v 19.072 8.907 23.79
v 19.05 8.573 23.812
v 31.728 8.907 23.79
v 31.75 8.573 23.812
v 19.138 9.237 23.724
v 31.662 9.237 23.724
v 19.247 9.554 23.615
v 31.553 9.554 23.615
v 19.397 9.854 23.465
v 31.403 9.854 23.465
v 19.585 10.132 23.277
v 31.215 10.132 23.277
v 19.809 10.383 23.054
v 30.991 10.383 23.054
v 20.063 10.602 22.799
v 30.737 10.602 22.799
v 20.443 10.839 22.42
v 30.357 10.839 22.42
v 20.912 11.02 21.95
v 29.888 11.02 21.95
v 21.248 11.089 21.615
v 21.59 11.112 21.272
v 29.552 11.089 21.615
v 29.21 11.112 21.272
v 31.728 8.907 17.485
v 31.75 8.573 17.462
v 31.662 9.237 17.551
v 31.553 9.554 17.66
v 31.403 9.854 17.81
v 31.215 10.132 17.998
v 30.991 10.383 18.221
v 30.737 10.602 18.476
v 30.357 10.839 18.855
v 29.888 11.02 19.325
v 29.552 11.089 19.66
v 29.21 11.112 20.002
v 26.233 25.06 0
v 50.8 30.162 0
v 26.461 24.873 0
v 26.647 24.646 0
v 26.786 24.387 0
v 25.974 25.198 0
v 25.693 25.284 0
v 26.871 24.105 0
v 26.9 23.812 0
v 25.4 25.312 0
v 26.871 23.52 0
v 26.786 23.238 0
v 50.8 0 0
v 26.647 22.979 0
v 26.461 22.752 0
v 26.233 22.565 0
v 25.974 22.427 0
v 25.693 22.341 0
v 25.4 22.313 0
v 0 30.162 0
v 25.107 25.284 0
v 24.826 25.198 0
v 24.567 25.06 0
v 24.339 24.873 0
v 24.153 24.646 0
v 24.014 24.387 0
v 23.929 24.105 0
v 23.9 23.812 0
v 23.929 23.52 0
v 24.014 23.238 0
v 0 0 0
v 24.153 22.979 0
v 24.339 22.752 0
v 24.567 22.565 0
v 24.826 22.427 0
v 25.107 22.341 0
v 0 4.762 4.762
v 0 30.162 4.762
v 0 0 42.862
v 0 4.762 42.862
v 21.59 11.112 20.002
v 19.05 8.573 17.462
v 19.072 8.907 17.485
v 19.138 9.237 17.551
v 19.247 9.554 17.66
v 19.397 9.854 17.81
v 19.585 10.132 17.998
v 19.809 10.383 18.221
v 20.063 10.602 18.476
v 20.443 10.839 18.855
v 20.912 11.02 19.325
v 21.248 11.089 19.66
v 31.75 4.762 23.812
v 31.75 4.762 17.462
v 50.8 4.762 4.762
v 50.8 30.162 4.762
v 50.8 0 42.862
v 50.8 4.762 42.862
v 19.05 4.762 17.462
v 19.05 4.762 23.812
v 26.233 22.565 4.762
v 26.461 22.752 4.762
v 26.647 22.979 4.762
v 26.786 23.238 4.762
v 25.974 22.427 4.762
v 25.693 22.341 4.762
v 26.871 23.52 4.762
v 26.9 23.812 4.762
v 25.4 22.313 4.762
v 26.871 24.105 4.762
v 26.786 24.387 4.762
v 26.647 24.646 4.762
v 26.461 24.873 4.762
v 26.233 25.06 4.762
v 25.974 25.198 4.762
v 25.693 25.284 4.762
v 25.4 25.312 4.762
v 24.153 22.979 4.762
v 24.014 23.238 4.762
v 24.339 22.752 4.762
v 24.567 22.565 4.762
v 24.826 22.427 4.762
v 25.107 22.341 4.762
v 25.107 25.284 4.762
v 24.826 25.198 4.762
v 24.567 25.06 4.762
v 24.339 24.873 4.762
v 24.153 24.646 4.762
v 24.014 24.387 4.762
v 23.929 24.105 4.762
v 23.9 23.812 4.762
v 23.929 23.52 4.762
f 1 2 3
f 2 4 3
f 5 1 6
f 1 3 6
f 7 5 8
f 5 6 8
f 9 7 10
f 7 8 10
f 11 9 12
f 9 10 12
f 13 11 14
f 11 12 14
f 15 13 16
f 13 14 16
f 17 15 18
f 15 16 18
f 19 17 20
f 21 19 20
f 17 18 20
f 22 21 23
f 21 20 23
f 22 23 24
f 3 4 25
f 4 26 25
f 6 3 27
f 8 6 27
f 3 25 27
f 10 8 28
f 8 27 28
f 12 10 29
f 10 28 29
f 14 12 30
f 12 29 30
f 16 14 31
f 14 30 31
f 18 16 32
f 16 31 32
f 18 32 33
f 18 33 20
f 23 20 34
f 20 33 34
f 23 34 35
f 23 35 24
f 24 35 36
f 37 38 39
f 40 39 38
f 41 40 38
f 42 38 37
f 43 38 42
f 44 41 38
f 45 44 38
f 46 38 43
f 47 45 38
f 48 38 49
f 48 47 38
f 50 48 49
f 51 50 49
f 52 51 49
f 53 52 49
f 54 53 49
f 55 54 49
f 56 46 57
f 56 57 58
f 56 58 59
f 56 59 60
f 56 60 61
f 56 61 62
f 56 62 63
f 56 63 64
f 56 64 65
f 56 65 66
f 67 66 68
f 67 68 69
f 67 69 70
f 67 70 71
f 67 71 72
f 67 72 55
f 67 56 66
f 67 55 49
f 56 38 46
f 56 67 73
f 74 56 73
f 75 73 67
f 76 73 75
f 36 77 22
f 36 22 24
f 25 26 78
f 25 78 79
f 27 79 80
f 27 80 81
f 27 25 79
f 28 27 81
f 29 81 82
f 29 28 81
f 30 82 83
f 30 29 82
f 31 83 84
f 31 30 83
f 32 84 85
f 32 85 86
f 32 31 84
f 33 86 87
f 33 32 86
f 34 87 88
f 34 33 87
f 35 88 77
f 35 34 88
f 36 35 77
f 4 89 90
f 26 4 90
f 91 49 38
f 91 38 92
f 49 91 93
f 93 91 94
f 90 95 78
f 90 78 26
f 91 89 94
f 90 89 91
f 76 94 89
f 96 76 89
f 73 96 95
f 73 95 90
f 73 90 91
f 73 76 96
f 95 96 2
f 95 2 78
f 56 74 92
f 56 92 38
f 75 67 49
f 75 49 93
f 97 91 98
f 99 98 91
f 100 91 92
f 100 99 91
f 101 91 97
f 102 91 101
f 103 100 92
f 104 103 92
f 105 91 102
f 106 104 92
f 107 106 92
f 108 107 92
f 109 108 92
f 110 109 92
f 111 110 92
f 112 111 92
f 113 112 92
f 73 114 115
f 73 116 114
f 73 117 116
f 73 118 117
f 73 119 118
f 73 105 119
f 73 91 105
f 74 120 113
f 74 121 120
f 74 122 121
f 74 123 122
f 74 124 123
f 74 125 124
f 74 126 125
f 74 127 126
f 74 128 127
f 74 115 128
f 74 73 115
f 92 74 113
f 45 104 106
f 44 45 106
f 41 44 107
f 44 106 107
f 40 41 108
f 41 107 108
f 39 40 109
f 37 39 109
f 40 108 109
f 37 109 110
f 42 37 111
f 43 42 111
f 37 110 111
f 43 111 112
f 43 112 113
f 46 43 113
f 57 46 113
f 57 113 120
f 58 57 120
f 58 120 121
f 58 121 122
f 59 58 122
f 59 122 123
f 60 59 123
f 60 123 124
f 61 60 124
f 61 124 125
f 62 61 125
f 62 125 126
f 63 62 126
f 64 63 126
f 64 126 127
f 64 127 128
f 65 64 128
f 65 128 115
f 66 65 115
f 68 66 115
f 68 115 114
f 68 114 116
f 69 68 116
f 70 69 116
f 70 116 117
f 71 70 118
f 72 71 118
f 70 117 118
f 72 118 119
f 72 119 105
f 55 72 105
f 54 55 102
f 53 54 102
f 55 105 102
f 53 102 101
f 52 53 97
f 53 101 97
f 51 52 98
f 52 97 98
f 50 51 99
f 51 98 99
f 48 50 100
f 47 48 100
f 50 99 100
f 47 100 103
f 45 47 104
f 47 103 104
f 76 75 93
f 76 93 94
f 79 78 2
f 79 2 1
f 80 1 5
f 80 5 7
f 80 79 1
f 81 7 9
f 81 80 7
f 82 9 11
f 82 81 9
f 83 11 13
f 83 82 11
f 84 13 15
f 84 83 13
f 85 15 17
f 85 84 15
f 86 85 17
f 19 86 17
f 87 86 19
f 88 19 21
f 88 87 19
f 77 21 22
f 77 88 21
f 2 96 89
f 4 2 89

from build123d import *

# Parameters (mm, degrees)
BOSS_EXTRUDE1_DEPTH = 50.8
SKETCH2_W           = 12.7
SKETCH2_H           = 6.35
BOSS_EXTRUDE2_DEPTH = 6.35
SKETCH3_R           = 1.499997
CUT_EXTRUDE1_DEPTH  = 71.299547696
FILLET1_R           = 2.54


with BuildPart() as part:
    # Sketch1 → Boss-Extrude1 (new body)
    with BuildSketch(Plane(origin=(0, 0, 0), x_dir=(0, 0, -1), z_dir=(1, 0, 0))):
        Polygon((0, 0), (-42.8625, 0), (-42.8625, 4.7625), (-4.7625, 4.7625), (-4.7625, 30.1625), (0, 30.1625), align=None)
    extrude(amount=BOSS_EXTRUDE1_DEPTH)

    # Sketch2 → Boss-Extrude2 (add)
    with BuildSketch(Plane(origin=(0, 4.7625, 0), x_dir=(1, 0, 0), z_dir=(0, 1, 0))):
        with Locations((25.4, -20.6375)):
            Rectangle(SKETCH2_W, SKETCH2_H)
    extrude(amount=BOSS_EXTRUDE2_DEPTH)

    # Sketch3 → Cut-Extrude1 (cut, through all)
    with BuildSketch(Plane.XY.offset(4.7625)):
        with Locations((25.4, 23.8125)):
            Circle(SKETCH3_R)
    extrude(amount=-CUT_EXTRUDE1_DEPTH, mode=Mode.SUBTRACT)

    # Fillet1
    fillet1_edges = [part.edges().sort_by_distance(p)[0] for p in [
        (19.05, 11.1125, 20.6375),
        (25.4, 11.1125, 23.8125),
        (31.75, 11.1125, 20.6375),
        (25.4, 11.1125, 17.4625),
    ]]
    fillet(fillet1_edges, radius=FILLET1_R)


solid = part.part
